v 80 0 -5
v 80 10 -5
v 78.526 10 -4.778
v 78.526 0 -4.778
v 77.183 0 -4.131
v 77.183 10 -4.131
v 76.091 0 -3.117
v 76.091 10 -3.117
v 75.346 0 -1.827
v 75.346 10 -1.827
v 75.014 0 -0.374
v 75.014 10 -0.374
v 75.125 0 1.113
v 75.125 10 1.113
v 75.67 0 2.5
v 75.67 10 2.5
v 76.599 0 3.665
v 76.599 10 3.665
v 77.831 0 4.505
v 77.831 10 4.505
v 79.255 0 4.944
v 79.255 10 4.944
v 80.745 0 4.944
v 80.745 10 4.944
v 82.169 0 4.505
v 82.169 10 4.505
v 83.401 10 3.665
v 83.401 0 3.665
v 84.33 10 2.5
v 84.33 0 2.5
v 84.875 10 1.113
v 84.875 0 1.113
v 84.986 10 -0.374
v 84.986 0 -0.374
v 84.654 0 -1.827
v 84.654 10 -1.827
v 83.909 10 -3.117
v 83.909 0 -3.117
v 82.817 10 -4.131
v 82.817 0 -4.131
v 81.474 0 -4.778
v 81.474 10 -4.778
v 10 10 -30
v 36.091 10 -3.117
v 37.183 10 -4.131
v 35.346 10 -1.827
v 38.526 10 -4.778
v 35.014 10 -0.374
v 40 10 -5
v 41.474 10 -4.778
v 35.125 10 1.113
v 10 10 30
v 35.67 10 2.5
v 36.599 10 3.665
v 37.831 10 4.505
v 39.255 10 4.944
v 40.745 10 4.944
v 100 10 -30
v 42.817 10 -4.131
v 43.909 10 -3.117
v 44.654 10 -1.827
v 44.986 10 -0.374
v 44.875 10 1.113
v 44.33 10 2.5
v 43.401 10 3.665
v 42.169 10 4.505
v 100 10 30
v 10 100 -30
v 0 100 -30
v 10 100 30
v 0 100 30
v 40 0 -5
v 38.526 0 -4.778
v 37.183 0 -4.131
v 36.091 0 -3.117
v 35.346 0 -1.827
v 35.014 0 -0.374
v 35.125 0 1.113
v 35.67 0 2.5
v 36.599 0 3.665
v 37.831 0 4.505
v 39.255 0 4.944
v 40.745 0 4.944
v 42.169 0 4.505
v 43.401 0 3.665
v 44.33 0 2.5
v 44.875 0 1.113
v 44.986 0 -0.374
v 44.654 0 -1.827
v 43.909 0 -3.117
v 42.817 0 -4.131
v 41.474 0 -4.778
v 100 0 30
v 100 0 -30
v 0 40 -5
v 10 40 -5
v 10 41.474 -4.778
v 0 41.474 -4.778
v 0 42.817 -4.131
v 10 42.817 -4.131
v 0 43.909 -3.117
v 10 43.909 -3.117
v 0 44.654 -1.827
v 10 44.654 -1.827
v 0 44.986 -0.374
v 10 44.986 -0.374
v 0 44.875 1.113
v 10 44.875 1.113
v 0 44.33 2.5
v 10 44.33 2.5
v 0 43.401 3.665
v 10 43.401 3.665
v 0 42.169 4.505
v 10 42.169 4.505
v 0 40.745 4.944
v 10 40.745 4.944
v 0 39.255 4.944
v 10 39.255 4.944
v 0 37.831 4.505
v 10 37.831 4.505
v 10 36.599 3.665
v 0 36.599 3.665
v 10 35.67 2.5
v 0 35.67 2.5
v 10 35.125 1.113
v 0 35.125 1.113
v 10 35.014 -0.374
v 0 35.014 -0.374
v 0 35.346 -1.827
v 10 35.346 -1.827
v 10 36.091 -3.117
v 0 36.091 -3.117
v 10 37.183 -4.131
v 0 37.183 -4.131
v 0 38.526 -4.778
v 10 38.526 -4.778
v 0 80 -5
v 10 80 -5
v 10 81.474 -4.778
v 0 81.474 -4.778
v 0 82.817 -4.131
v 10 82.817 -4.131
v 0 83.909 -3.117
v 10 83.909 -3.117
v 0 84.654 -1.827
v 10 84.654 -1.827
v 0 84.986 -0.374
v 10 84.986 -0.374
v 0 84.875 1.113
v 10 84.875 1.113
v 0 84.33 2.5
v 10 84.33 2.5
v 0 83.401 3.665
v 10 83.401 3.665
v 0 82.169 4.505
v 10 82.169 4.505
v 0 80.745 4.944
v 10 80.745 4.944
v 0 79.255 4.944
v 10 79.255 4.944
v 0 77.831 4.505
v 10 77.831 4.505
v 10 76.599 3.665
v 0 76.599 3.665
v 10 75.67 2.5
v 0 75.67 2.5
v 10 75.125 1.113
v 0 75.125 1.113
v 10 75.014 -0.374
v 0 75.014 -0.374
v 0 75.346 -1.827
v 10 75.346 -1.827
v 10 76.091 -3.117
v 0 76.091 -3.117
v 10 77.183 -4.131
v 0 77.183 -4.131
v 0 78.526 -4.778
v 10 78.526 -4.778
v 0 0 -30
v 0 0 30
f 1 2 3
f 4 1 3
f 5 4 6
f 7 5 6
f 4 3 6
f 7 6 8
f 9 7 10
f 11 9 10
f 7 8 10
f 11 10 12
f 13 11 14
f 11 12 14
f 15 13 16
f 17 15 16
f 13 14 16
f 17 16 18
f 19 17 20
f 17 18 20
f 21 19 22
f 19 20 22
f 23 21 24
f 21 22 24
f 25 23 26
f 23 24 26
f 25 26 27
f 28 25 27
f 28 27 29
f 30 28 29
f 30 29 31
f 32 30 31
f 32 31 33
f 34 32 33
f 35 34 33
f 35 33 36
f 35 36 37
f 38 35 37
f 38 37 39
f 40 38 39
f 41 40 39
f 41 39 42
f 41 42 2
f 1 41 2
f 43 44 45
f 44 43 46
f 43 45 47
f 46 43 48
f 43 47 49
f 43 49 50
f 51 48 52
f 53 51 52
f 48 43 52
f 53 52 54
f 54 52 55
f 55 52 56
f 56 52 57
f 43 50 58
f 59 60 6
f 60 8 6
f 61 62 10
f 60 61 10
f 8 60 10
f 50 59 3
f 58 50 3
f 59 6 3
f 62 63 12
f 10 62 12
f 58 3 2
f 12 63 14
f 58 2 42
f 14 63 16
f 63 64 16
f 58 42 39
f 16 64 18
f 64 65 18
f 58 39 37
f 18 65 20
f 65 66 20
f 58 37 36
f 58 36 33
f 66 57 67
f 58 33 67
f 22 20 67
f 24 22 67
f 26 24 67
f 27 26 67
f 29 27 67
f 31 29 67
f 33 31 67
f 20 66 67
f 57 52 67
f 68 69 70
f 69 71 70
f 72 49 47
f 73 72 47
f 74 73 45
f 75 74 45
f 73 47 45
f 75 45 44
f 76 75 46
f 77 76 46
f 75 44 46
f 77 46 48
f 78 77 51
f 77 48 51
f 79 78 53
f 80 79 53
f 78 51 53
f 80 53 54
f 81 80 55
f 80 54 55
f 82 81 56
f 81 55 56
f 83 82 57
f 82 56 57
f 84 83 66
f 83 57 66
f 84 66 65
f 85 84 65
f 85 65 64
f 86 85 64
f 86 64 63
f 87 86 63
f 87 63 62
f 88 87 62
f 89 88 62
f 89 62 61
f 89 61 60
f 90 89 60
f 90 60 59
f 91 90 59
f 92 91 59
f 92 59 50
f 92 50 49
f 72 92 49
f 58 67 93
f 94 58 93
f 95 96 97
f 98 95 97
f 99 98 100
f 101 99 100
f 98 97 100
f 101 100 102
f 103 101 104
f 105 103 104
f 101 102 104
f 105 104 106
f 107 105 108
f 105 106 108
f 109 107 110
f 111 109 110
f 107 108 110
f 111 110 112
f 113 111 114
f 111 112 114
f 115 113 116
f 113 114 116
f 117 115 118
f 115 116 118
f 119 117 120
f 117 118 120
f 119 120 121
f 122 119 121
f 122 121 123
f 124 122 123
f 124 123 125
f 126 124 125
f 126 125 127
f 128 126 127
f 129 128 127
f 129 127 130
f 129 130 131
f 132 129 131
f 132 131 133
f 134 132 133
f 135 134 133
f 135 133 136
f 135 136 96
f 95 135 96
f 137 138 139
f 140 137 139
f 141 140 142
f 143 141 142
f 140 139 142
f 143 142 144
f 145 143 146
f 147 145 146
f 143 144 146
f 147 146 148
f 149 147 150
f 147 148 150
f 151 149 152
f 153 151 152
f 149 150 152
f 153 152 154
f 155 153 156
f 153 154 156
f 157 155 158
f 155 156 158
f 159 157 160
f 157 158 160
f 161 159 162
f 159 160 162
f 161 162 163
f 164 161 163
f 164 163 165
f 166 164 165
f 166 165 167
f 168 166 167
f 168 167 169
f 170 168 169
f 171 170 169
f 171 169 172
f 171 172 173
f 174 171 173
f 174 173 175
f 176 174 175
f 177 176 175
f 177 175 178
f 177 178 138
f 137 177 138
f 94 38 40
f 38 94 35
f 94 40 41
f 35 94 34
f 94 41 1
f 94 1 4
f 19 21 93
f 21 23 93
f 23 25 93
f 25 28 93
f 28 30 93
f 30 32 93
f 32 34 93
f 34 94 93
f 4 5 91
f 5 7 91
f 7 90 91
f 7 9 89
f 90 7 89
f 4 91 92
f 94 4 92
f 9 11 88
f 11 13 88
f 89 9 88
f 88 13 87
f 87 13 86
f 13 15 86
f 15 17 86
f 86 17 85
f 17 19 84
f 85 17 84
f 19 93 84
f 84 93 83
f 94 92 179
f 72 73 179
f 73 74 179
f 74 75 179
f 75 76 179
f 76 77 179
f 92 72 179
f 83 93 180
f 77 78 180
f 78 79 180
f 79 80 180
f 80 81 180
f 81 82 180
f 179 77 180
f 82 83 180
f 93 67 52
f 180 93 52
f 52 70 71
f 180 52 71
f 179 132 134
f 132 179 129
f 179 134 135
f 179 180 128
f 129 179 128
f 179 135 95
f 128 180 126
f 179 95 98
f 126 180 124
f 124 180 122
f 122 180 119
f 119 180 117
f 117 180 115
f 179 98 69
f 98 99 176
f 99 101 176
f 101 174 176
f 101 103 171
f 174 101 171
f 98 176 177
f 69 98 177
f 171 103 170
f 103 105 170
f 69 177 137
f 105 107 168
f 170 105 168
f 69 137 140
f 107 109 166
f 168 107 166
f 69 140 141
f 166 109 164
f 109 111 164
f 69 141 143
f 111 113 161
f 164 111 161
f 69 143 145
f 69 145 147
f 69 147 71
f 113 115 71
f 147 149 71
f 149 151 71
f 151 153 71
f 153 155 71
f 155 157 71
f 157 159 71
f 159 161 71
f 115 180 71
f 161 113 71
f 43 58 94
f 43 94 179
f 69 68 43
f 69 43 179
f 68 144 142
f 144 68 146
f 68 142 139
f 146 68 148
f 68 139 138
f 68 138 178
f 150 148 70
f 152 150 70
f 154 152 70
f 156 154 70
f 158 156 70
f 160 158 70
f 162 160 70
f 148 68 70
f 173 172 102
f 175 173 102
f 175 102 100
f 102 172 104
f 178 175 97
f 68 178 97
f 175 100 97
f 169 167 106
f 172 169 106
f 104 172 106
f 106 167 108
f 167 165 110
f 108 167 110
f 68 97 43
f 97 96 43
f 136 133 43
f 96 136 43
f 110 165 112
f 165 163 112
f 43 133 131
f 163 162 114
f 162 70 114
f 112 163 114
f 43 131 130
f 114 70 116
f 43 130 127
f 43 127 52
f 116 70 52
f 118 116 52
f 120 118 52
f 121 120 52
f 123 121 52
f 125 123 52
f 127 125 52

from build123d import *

# Parameters (mm, degrees)
BOSS_EXTRUDE1_DEPTH = 30
SKETCH2_R           = 5
CUT_EXTRUDE1_DEPTH  = 11
SKETCH3_R           = 5
CUT_EXTRUDE2_DEPTH  = 11


with BuildPart() as part:
    # Sketch1 → Boss-Extrude1 (new body, symmetric)
    with BuildSketch(Plane.XY):
        Polygon((0, 0), (0, 100), (10, 100), (10, 10), (100, 10), (100, 0), align=None)
    extrude(amount=BOSS_EXTRUDE1_DEPTH, both=True)

    # Sketch2 → Cut-Extrude1 (cut, through all)
    with BuildSketch(Plane(origin=(10, 0, 0), x_dir=(0, 0, -1), z_dir=(1, 0, 0))):
        with Locations((0, 40)):
            Circle(SKETCH2_R)
        with Locations((0, 80)):
            Circle(SKETCH2_R)
    extrude(amount=-CUT_EXTRUDE1_DEPTH, mode=Mode.SUBTRACT)

    # Sketch3 → Cut-Extrude2 (cut, through all)
    with BuildSketch(Plane(origin=(0, 10, 0), x_dir=(0, 0, -1), z_dir=(0, 1, 0))):
        with Locations((0, -80)):
            Circle(SKETCH3_R)
        with Locations((0, -40)):
            Circle(SKETCH3_R)
    extrude(amount=-CUT_EXTRUDE2_DEPTH, mode=Mode.SUBTRACT)


solid = part.part
